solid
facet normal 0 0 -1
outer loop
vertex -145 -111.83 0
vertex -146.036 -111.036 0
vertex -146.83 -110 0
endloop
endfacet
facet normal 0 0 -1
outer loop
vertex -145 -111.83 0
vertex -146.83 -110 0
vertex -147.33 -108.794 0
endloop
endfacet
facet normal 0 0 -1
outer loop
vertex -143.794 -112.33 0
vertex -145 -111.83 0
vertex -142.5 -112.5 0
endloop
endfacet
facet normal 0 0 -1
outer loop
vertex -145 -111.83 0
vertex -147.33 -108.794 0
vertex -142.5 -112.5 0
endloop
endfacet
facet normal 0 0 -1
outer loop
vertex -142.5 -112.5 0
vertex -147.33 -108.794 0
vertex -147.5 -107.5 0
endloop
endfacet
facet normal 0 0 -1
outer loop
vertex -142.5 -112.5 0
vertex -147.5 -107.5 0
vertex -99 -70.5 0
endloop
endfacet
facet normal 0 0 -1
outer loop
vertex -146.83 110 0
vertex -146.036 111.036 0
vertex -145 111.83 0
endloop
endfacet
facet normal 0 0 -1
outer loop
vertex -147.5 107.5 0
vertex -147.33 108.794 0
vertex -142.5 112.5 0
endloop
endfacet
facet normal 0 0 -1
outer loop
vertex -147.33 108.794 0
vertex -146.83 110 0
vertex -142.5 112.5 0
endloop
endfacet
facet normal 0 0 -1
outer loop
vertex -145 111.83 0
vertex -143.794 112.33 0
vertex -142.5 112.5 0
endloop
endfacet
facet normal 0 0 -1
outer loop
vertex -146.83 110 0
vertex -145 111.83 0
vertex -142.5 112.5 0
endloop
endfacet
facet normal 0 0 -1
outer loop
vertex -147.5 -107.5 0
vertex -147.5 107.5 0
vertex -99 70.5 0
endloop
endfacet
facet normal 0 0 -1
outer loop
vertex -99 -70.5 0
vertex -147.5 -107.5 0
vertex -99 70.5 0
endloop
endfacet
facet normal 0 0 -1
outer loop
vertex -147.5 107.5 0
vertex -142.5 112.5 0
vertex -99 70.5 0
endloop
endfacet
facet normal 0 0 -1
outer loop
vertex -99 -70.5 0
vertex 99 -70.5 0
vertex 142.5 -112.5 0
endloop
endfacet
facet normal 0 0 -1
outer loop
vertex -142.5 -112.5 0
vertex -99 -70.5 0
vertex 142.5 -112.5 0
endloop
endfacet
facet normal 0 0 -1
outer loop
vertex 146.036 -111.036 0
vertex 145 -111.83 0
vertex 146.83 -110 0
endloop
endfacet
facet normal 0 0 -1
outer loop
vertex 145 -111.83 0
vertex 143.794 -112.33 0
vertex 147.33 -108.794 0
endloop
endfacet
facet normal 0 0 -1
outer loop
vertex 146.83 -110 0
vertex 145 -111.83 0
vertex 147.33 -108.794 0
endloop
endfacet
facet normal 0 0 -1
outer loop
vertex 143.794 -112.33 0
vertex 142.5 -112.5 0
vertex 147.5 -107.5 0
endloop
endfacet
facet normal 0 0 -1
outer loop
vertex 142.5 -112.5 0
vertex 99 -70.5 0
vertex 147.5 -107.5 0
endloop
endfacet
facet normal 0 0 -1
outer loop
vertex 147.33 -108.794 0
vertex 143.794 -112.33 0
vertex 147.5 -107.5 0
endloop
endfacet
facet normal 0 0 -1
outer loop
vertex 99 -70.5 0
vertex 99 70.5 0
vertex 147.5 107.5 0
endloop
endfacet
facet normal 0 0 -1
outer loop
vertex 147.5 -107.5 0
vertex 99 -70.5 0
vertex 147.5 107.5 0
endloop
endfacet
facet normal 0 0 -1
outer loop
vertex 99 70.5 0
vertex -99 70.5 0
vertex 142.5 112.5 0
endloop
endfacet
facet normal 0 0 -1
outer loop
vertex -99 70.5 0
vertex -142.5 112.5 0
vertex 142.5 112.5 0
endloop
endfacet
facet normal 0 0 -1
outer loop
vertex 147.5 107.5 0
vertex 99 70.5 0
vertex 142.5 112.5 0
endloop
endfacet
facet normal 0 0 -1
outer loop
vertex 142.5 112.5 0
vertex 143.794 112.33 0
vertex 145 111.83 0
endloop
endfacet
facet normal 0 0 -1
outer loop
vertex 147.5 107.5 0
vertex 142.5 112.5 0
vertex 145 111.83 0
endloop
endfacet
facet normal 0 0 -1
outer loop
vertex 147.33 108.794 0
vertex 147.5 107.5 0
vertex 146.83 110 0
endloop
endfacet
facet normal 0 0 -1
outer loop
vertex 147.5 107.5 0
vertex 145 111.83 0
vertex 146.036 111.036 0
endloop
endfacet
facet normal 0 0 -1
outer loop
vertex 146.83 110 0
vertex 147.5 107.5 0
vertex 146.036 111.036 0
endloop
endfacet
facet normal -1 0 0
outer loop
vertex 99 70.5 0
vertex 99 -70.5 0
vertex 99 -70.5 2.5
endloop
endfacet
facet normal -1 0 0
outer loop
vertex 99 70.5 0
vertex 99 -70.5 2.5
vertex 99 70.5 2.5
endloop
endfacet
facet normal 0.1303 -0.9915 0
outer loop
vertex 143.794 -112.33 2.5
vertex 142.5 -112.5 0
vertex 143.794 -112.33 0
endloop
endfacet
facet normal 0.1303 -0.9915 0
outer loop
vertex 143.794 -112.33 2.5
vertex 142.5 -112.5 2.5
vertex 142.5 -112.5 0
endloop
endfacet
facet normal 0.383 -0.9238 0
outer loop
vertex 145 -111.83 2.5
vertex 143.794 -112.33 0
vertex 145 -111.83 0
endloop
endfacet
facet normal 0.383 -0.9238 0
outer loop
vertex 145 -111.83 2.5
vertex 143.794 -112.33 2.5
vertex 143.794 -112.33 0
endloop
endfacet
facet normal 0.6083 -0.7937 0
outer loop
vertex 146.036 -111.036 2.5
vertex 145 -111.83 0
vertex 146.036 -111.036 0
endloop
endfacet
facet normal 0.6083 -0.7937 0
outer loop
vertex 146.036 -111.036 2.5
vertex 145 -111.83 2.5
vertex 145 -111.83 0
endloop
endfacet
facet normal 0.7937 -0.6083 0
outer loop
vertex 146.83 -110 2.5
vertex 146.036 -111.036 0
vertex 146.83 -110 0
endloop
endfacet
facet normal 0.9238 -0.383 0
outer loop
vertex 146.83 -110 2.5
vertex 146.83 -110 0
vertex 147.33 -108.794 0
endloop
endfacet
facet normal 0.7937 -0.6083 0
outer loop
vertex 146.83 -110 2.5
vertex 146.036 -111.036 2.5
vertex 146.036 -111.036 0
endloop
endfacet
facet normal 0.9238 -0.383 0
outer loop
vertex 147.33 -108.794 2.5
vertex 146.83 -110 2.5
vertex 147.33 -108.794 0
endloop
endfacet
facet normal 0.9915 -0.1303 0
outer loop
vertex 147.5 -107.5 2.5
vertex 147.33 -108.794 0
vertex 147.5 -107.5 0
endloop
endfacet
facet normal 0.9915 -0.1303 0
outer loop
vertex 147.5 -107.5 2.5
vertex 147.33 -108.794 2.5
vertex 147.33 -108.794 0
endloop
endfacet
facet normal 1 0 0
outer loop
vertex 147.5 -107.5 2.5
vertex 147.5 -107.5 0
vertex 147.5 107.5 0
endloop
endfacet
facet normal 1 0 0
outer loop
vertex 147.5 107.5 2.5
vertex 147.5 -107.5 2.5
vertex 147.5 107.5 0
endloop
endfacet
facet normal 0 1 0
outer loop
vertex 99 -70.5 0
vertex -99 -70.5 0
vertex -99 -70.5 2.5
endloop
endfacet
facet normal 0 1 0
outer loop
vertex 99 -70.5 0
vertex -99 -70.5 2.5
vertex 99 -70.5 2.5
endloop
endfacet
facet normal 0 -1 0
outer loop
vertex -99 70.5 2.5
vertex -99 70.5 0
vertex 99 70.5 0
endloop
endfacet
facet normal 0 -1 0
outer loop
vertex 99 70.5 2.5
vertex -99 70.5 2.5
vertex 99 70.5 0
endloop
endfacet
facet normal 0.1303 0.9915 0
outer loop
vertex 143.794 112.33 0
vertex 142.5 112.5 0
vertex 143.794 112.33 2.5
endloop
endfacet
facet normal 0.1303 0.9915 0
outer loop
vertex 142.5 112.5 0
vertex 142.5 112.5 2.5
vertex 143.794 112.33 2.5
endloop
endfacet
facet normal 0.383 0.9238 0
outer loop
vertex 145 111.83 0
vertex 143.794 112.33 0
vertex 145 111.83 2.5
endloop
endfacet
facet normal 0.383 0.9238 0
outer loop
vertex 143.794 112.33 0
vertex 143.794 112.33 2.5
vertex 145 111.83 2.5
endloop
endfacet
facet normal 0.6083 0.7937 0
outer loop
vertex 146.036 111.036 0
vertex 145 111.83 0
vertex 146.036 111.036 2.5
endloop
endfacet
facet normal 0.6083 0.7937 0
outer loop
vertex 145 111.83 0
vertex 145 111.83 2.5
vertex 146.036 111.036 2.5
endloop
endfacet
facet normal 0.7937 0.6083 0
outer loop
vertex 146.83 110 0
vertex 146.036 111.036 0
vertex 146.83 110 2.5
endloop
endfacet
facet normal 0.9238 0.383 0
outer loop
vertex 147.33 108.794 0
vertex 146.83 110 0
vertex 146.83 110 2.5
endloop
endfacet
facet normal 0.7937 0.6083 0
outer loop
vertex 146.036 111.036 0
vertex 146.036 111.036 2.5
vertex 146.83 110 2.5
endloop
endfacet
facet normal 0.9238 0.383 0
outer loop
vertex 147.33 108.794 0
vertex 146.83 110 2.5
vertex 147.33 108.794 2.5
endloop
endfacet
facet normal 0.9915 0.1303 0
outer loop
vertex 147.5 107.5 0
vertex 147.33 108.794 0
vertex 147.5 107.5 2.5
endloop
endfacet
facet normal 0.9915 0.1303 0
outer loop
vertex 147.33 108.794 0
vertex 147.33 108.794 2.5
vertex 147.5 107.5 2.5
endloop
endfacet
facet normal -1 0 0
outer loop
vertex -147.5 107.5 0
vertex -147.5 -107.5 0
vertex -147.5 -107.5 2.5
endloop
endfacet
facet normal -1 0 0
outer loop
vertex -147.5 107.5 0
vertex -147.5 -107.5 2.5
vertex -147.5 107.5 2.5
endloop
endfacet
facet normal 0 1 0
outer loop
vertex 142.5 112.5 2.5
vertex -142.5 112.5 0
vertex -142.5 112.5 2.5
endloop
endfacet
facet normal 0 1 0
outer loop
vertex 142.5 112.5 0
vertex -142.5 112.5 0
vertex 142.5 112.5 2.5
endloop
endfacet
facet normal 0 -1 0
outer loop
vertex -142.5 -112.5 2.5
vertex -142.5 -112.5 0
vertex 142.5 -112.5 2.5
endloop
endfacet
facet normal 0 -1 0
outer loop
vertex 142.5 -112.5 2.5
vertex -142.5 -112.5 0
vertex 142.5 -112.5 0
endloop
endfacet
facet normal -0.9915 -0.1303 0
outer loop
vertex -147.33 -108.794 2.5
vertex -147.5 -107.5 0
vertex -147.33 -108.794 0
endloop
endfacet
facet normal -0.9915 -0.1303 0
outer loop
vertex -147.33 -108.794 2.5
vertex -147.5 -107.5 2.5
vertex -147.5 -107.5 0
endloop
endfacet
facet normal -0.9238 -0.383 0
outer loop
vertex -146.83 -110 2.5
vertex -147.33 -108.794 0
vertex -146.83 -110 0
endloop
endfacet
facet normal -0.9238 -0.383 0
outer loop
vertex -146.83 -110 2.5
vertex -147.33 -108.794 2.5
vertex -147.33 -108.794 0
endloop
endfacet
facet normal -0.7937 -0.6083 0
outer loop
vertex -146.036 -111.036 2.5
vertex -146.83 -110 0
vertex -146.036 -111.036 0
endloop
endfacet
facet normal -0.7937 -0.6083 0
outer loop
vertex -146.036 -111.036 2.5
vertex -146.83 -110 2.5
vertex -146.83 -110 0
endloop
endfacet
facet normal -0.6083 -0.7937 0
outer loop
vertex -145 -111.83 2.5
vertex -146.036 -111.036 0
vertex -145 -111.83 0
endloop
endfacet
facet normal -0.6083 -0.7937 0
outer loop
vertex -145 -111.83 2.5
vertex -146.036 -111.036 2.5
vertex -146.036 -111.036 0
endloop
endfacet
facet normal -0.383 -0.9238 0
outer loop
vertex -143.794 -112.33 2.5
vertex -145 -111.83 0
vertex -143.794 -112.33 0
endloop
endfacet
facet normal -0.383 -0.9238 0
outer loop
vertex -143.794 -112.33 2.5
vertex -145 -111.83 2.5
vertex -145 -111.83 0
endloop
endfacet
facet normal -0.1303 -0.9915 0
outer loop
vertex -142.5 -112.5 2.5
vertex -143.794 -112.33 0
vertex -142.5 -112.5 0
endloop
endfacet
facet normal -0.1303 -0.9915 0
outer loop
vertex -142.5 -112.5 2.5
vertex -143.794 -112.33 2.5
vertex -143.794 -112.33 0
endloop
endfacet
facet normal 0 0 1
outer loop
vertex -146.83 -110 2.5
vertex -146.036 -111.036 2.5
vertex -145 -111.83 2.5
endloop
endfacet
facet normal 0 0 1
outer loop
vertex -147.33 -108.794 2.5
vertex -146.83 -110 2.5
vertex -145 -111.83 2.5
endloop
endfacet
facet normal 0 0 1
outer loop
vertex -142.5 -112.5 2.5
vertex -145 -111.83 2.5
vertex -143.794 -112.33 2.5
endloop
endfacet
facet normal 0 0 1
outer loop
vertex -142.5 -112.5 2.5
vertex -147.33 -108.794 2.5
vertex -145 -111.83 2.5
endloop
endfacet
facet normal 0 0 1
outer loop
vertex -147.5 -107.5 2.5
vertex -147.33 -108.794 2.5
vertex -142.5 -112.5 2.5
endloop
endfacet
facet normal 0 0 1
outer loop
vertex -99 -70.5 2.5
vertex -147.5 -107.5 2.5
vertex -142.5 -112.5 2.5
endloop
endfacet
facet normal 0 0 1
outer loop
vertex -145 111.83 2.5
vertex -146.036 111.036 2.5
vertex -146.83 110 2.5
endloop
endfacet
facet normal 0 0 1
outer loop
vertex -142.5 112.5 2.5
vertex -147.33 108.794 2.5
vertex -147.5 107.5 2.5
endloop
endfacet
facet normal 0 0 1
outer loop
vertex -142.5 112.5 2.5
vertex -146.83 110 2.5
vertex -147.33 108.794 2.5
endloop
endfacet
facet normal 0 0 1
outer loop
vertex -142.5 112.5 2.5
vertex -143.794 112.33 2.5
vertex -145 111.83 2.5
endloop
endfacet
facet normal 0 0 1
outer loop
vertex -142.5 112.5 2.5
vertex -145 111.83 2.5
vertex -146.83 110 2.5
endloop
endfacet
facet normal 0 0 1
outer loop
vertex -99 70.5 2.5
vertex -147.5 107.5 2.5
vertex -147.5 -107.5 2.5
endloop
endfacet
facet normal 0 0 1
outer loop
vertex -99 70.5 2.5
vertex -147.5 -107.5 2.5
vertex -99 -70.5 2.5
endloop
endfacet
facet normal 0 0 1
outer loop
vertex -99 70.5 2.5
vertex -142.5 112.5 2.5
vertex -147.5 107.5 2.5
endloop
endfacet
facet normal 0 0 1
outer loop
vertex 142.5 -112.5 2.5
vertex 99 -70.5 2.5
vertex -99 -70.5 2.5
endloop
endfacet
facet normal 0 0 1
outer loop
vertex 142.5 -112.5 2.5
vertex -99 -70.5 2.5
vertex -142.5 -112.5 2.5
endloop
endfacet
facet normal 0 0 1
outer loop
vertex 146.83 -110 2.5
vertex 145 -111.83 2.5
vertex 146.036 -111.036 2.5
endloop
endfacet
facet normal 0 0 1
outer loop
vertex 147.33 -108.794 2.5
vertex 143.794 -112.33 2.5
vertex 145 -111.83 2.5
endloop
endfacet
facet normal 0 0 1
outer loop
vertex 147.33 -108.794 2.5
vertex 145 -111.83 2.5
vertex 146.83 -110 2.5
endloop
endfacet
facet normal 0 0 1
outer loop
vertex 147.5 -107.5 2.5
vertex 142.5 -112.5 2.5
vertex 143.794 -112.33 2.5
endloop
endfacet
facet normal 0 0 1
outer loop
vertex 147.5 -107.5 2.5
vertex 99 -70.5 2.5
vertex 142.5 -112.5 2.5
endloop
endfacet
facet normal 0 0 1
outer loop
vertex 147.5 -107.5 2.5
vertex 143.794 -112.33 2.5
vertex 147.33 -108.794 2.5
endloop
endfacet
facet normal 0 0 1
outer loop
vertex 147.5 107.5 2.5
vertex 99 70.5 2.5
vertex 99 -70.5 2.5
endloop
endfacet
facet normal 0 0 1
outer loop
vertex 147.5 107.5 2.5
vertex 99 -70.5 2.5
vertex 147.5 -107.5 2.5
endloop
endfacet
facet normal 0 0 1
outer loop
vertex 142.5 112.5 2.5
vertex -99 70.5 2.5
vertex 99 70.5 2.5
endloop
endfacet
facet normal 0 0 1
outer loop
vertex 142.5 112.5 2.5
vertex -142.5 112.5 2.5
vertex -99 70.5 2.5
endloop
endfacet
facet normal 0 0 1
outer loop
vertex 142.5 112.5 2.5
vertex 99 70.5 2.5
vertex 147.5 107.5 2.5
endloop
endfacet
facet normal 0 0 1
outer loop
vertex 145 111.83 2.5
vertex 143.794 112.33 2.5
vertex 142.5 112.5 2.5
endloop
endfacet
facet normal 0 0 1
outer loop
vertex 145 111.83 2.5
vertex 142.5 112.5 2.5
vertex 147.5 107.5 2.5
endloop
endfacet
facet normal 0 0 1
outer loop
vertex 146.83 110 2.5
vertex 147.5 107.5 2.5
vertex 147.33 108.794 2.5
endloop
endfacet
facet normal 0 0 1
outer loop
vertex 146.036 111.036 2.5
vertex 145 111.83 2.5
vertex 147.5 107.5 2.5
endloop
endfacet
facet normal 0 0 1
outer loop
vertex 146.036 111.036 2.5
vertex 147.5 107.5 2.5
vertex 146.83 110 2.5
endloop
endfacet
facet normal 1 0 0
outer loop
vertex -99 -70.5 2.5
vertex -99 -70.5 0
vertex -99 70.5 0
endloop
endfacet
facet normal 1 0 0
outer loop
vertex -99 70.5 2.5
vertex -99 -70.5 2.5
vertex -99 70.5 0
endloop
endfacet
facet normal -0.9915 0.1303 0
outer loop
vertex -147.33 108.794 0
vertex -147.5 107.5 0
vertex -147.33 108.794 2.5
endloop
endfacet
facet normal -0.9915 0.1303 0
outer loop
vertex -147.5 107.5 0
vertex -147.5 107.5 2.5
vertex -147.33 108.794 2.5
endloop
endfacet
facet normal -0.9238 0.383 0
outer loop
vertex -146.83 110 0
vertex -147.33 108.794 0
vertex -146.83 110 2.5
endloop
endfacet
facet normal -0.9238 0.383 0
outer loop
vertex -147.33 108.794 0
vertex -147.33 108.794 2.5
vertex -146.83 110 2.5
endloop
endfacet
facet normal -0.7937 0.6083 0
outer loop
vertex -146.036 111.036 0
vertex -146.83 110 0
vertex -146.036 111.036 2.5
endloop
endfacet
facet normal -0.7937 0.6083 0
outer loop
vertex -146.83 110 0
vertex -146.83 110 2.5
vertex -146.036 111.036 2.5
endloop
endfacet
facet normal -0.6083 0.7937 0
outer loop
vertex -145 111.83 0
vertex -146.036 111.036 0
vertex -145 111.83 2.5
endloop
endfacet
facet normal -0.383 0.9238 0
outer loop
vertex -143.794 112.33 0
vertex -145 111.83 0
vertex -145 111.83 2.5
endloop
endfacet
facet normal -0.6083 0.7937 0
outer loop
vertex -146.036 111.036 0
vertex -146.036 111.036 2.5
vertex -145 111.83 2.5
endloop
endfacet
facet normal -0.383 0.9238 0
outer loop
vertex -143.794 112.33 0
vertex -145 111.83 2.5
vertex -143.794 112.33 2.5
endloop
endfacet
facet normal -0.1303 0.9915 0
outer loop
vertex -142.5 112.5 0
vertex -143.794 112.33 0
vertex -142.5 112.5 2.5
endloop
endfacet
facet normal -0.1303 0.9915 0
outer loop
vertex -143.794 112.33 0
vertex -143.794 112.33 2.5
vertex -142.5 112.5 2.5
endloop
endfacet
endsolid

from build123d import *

# Parameters (mm, degrees)
SKETCH1_W           = 295
SKETCH1_H           = 225
SKETCH1_W_2         = 198
SKETCH1_H_2         = 141
BOSS_EXTRUDE1_DEPTH = 2.5
FILLET1_R           = 5


with BuildPart() as part:
    # Sketch1 → Boss-Extrude1 (new body)
    with BuildSketch(Plane.XY):
        Rectangle(SKETCH1_W, SKETCH1_H)
        Rectangle(SKETCH1_W_2, SKETCH1_H_2, mode=Mode.SUBTRACT)
    extrude(amount=BOSS_EXTRUDE1_DEPTH)

    # Fillet1
    fillet1_edges = [part.edges().sort_by_distance(p)[0] for p in [
        (147.5, -112.5, 1.25),
        (-147.5, -112.5, 1.25),
        (-147.5, 112.5, 1.25),
        (147.5, 112.5, 1.25),
    ]]
    fillet(fillet1_edges, radius=FILLET1_R)


solid = part.part
